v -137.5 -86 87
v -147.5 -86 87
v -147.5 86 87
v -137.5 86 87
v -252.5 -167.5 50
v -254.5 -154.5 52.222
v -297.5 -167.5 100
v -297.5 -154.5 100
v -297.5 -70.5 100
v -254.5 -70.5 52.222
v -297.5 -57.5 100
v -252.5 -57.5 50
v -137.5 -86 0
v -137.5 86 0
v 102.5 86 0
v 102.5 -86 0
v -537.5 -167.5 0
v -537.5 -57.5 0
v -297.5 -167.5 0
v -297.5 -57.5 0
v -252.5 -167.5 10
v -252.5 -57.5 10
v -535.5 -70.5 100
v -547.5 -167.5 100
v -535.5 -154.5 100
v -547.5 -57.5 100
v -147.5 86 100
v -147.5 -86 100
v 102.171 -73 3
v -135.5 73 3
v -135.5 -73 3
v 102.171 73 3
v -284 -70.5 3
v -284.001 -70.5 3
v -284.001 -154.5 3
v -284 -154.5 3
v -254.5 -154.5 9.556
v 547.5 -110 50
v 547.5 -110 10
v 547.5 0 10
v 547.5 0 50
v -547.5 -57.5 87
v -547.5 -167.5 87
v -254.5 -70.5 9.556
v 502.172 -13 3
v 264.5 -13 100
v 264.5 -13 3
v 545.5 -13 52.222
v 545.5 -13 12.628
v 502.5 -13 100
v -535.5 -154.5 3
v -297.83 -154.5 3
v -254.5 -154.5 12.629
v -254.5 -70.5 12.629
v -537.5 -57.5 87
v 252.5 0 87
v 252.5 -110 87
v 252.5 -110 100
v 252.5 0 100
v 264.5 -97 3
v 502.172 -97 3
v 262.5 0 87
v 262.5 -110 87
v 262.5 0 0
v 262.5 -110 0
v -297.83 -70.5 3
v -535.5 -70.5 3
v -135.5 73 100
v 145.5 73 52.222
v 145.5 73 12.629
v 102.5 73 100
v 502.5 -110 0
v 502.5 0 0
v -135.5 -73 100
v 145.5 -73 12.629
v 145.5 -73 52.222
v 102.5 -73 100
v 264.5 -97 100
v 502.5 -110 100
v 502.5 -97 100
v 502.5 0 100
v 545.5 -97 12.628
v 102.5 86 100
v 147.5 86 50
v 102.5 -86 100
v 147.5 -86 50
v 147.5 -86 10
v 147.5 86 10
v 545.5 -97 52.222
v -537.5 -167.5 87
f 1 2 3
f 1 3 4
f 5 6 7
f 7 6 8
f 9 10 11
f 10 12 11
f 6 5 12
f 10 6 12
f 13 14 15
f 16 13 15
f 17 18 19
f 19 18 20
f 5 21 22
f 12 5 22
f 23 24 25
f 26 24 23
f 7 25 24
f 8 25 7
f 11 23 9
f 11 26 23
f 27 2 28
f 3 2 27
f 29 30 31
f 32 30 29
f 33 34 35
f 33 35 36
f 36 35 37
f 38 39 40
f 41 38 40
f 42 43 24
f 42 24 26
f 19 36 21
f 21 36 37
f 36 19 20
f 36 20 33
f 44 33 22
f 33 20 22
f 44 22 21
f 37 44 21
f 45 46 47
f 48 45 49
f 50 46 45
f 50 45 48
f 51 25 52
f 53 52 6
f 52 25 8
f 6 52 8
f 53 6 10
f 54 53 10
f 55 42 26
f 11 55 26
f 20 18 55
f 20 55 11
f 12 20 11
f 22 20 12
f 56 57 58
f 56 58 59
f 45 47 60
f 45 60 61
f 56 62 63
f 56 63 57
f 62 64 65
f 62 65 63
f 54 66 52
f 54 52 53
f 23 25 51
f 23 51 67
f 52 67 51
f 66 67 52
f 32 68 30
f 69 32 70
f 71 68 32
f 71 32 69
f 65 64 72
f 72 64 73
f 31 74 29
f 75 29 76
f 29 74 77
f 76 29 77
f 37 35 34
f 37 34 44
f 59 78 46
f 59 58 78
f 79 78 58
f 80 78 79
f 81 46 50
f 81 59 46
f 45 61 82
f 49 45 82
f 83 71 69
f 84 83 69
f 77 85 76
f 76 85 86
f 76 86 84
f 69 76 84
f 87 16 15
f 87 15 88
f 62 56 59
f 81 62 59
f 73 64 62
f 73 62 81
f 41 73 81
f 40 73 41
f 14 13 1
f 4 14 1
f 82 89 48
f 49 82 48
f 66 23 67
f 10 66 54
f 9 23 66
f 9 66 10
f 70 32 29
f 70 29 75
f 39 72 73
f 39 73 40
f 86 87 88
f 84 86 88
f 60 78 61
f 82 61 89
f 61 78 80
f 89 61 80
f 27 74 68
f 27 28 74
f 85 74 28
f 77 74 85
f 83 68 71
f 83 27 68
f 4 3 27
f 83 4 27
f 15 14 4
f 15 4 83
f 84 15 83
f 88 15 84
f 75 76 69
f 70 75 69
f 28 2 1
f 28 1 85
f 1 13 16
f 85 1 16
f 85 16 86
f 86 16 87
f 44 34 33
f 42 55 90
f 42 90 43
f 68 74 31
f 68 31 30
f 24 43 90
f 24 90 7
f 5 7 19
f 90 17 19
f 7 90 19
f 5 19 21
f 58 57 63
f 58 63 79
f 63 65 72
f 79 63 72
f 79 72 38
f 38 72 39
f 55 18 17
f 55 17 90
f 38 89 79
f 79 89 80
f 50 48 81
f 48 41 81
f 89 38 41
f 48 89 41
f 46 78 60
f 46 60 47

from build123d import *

# Parameters (mm, degrees)
F0_W      = 295
F0_H      = 172
F1_DEPTH  = 100
F3_W      = 281
F3_H      = 146
F4_DEPTH  = 97
F2_W      = 10
F2_H      = 87
F5_DEPTH  = 172.001
F6_W      = 46.097722
F6_H      = 172
F7_DEPTH  = 3
F8_W      = 295
F8_H      = 110
F9_DEPTH  = 100
F12_W     = 281
F12_H     = 84
F13_DEPTH = 97
F10_W     = 10
F10_H     = 87
F14_DEPTH = 167.500991
F11_W     = 10
F11_H     = 87
F15_DEPTH = 110.001
F16_DEPTH = 97
F17_W     = 46.097722
F17_H     = 110
F18_DEPTH = 3
F19_W     = 46.097722
F19_H     = 110
F20_DEPTH = 3


with BuildPart() as f1:
    # F0 (on Top) → F1 (new body)
    with BuildSketch(Plane.XY):
        Rectangle(F0_W, F0_H)
    extrude(amount=F1_DEPTH)

    # F3 (on face) → F4 (cut)
    with BuildSketch(Plane.XY.offset(100)):
        with Locations((5, 0)):
            Rectangle(F3_W, F3_H)
    extrude(amount=-F4_DEPTH, mode=Mode.SUBTRACT)

    # F2 (on face) → F5 (cut, through all)
    with BuildSketch(Plane.XZ.offset(86)):
        with Locations((-142.5, 43.5)):
            Rectangle(F2_W, F2_H)
        Polygon((102.5, 100), (147.5, 50), (147.5, 100), align=None)
        Polygon((147.5, 0), (147.5, 10), (102.5, 0), align=None)
    extrude(amount=-F5_DEPTH, mode=Mode.SUBTRACT)

    # F6 (on face) → F7 (join)
    with BuildSketch(Plane(origin=(4.823529, 0, -21.705882), x_dir=(0.976187, 0, 0.21693), z_dir=(0.21693, 0, -0.976187))):
        with Locations((123.108035, 0)):
            Rectangle(F6_W, F6_H)
    extrude(amount=-F7_DEPTH)


with BuildPart() as f9:
    # F8 (on Top) → F9 (new body)
    with BuildSketch(Plane.XY):
        with Locations((400, -55)):
            Rectangle(F8_W, F8_H)
        with Locations((-400, -112.499991)):
            Rectangle(F8_W, F8_H)
    extrude(amount=F9_DEPTH)

    # F12 (on face) → F13 (cut)
    with BuildSketch(Plane.XY.offset(100)):
        with Locations((405, -55)):
            Rectangle(F12_W, F12_H)
    extrude(amount=-F13_DEPTH, mode=Mode.SUBTRACT)

    # F10 (on face) → F14 (cut, through all)
    with BuildSketch(Plane(origin=(0, 0, 0), x_dir=(-1, 0, 0), z_dir=(0, 1, 0))):
        Polygon((-547.5, 100), (-547.5, 50), (-502.5, 100), align=None)
        Polygon((-502.5, 0), (-547.5, 10), (-547.5, 0), align=None)
        with Locations((-257.5, 43.5)):
            Rectangle(F10_W, F10_H)
    extrude(amount=-F14_DEPTH, mode=Mode.SUBTRACT)

    # F11 (on face) → F15 (cut, through all)
    with BuildSketch(Plane(origin=(0, -57.499991, 0), x_dir=(-1, 0, 0), z_dir=(0, 1, 0))):
        Polygon((252.5, 50), (297.5, 100), (252.5, 100), align=None)
        Polygon((297.5, 0), (252.5, 10), (252.5, 0), align=None)
        with Locations((542.5, 43.5)):
            Rectangle(F11_W, F11_H)
    extrude(amount=-F15_DEPTH, mode=Mode.SUBTRACT)

    # F12 (on face) → F16 (cut)
    with BuildSketch(Plane.XY.offset(100)):
        with Locations((-395, -112.499991)):
            Rectangle(F12_W, F12_H)
    extrude(amount=-F16_DEPTH, mode=Mode.SUBTRACT)

    # F17 (on face) → F18 (join)
    with BuildSketch(Plane(origin=(23.647059, 0, -106.411765), x_dir=(0.976187, 0, 0.21693), z_dir=(0.21693, 0, -0.976187))):
        with Locations((513.582859, 55)):
            Rectangle(F17_W, F17_H)
    extrude(amount=-F18_DEPTH)

    # F19 (on face) → F20 (join)
    with BuildSketch(Plane(origin=(-14, 0, 63), x_dir=(0.976187, 0, 0.21693), z_dir=(0.21693, 0, -0.976187))):
        with Locations((-267.366789, 112.499991)):
            Rectangle(F19_W, F19_H)
    extrude(amount=-F20_DEPTH)


solid = Compound([f1.part, f9.part])
